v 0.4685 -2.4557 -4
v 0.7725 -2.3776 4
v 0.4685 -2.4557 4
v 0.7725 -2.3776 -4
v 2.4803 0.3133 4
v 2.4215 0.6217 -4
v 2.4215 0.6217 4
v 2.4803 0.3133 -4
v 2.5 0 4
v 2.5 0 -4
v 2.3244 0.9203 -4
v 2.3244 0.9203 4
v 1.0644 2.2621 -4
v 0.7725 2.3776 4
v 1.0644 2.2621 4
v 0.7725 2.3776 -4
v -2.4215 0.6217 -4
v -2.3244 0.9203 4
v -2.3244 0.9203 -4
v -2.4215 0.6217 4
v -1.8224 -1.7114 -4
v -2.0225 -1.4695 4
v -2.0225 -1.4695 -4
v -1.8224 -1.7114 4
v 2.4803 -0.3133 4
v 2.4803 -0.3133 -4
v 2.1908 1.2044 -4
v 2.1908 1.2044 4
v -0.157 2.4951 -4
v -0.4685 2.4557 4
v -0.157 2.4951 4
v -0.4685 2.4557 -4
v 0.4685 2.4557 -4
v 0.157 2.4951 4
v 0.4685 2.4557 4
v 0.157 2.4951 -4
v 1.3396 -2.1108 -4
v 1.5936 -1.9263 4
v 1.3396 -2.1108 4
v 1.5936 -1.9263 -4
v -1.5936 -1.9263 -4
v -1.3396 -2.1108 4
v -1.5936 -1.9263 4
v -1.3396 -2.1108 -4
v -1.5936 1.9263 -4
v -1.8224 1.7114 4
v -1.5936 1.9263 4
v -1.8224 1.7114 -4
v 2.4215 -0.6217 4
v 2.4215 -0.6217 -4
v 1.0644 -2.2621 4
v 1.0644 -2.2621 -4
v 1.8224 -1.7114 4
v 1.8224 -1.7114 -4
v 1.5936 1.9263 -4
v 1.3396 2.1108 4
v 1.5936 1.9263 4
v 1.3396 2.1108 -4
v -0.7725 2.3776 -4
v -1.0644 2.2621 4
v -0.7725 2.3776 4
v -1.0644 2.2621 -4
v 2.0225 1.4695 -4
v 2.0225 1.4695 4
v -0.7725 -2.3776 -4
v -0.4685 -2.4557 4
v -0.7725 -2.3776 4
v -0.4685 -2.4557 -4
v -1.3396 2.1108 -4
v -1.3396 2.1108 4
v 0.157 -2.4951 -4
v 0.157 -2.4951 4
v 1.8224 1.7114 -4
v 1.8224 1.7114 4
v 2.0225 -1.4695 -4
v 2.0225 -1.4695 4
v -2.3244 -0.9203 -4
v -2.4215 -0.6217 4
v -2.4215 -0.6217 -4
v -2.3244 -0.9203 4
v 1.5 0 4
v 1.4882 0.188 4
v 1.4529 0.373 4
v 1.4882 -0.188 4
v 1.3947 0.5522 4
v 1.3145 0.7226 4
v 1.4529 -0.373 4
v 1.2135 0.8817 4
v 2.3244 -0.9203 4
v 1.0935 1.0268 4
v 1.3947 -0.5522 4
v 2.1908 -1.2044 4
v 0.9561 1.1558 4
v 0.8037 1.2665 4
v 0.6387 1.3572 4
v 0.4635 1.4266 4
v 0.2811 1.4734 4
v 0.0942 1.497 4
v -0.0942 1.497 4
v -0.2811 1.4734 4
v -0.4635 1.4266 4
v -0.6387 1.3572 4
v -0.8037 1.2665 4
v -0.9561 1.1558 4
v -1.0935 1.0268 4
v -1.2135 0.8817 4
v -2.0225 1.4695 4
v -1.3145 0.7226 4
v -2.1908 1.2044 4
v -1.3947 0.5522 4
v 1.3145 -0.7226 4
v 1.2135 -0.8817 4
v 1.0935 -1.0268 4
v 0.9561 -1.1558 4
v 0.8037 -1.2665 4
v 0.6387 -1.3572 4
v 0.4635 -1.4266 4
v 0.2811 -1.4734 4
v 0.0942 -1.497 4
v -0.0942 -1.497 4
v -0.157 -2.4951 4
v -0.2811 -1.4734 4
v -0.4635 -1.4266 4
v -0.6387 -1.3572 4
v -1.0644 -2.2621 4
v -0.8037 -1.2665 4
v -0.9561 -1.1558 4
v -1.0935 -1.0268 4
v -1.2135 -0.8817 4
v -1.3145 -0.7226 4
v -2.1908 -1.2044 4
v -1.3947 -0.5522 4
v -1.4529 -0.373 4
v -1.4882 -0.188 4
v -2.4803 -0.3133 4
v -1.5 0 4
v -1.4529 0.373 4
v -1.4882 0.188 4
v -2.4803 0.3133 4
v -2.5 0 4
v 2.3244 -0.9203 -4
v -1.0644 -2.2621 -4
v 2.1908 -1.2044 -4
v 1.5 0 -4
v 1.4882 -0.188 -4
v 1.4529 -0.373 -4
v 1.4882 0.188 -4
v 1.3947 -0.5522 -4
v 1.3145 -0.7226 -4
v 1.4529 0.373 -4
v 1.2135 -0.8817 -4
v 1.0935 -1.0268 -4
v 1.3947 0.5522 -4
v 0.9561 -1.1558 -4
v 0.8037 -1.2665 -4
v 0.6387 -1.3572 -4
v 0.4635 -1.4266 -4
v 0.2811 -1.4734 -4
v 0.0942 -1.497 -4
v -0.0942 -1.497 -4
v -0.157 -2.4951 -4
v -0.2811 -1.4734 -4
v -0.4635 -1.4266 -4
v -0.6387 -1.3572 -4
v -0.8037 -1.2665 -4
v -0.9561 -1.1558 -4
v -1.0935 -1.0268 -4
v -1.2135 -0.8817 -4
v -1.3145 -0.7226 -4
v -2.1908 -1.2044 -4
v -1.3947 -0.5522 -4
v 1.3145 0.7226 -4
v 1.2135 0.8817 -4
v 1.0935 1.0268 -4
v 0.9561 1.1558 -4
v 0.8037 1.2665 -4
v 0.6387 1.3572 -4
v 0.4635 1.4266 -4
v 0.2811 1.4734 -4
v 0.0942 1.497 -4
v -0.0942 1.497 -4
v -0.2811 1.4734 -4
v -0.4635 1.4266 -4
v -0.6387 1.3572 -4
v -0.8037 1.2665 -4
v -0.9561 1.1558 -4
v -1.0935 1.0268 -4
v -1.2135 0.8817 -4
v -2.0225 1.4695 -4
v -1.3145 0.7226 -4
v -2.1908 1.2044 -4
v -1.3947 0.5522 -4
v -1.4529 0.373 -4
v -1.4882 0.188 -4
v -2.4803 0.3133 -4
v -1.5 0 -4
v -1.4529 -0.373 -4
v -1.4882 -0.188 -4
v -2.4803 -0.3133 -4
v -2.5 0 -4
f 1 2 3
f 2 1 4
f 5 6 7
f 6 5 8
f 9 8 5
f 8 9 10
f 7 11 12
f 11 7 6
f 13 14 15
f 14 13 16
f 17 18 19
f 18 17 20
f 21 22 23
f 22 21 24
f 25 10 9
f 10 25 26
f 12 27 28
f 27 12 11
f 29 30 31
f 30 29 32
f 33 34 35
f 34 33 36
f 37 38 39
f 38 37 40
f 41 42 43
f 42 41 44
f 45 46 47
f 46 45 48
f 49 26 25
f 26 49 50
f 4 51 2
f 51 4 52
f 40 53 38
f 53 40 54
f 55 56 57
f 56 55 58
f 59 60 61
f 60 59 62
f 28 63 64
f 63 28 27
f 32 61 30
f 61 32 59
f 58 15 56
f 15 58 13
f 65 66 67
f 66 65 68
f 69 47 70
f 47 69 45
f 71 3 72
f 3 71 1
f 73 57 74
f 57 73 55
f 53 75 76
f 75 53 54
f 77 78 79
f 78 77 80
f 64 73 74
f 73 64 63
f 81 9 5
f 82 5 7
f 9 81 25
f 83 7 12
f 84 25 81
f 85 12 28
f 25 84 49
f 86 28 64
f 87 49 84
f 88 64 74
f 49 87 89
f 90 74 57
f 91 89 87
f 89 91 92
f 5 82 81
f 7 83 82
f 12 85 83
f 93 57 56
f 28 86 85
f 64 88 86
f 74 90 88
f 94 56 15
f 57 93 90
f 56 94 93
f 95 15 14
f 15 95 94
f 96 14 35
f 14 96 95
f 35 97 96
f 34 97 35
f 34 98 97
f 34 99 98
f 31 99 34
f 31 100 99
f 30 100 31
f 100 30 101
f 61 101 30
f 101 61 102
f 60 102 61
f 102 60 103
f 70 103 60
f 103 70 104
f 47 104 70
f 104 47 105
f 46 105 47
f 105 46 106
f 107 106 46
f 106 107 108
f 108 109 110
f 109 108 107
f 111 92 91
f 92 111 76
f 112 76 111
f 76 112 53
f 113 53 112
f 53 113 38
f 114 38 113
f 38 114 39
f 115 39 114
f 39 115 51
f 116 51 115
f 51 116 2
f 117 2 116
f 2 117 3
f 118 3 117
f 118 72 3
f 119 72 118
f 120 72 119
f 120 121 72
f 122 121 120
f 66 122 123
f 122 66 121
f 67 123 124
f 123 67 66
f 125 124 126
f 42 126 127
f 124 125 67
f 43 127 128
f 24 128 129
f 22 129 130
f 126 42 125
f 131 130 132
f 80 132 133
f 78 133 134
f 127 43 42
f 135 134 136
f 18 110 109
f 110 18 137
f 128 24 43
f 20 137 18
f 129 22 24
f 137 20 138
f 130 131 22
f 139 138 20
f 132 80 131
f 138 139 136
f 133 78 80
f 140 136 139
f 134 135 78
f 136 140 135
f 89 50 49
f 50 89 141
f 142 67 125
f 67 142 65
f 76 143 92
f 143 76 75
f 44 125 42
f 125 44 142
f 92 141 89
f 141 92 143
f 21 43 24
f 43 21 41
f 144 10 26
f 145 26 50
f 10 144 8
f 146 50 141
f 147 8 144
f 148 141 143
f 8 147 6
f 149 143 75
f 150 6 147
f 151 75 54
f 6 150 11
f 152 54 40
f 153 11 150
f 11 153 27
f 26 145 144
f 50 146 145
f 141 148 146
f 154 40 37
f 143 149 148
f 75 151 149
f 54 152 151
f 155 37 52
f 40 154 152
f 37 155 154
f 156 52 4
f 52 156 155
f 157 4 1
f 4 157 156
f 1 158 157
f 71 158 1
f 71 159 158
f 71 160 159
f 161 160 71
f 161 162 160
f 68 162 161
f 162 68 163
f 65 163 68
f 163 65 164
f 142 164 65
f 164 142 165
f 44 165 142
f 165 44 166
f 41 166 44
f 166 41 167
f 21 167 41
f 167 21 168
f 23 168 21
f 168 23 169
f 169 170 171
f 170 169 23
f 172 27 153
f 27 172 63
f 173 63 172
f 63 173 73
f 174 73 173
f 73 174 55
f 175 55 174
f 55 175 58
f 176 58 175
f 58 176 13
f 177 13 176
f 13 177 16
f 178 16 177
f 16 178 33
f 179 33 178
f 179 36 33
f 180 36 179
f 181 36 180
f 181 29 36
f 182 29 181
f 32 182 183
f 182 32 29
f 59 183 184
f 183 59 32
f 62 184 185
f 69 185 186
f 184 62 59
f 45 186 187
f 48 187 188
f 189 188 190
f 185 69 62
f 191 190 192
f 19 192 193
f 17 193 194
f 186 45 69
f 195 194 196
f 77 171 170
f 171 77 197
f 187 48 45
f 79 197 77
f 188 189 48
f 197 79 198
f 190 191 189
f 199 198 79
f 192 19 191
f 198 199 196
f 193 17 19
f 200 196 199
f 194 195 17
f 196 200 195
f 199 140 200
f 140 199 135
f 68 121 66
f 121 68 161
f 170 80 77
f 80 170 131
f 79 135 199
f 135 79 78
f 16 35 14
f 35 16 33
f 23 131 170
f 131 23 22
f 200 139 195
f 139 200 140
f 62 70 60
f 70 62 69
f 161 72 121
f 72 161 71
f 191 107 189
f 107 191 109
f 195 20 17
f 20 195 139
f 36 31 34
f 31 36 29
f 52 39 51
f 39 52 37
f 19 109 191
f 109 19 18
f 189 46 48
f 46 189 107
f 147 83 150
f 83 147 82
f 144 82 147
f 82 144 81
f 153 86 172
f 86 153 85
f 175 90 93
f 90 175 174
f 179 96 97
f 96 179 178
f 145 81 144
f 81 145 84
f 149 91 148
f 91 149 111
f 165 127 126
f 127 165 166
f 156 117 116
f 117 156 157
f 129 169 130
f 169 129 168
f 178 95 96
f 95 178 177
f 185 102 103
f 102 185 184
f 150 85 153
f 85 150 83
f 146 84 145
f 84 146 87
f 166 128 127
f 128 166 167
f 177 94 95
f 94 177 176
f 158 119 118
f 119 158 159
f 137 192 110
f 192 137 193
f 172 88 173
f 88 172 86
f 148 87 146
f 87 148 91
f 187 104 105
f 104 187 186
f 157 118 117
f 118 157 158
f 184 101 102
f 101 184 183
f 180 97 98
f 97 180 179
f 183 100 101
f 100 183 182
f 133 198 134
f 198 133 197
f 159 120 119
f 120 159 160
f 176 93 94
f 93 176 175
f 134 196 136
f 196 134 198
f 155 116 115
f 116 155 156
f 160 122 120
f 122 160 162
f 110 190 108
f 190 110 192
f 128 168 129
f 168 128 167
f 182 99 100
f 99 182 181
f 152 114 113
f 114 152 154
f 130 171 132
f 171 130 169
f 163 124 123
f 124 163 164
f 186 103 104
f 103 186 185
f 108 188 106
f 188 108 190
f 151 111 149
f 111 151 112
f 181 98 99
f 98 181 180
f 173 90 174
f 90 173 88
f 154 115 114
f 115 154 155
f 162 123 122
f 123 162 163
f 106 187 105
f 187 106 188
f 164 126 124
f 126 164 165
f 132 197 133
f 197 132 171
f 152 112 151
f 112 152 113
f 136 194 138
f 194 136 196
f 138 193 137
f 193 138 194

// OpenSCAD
$fn = 50;


difference() {
	union() {
		translate(v = [0, 0, -4.0000000000]) {
			cylinder(h = 8, r = 2.5000000000);
		}
	}
	union() {
		translate(v = [0, 0, -100.0000000000]) {
			cylinder(h = 200, r = 1.5000000000);
		}
	}
}
